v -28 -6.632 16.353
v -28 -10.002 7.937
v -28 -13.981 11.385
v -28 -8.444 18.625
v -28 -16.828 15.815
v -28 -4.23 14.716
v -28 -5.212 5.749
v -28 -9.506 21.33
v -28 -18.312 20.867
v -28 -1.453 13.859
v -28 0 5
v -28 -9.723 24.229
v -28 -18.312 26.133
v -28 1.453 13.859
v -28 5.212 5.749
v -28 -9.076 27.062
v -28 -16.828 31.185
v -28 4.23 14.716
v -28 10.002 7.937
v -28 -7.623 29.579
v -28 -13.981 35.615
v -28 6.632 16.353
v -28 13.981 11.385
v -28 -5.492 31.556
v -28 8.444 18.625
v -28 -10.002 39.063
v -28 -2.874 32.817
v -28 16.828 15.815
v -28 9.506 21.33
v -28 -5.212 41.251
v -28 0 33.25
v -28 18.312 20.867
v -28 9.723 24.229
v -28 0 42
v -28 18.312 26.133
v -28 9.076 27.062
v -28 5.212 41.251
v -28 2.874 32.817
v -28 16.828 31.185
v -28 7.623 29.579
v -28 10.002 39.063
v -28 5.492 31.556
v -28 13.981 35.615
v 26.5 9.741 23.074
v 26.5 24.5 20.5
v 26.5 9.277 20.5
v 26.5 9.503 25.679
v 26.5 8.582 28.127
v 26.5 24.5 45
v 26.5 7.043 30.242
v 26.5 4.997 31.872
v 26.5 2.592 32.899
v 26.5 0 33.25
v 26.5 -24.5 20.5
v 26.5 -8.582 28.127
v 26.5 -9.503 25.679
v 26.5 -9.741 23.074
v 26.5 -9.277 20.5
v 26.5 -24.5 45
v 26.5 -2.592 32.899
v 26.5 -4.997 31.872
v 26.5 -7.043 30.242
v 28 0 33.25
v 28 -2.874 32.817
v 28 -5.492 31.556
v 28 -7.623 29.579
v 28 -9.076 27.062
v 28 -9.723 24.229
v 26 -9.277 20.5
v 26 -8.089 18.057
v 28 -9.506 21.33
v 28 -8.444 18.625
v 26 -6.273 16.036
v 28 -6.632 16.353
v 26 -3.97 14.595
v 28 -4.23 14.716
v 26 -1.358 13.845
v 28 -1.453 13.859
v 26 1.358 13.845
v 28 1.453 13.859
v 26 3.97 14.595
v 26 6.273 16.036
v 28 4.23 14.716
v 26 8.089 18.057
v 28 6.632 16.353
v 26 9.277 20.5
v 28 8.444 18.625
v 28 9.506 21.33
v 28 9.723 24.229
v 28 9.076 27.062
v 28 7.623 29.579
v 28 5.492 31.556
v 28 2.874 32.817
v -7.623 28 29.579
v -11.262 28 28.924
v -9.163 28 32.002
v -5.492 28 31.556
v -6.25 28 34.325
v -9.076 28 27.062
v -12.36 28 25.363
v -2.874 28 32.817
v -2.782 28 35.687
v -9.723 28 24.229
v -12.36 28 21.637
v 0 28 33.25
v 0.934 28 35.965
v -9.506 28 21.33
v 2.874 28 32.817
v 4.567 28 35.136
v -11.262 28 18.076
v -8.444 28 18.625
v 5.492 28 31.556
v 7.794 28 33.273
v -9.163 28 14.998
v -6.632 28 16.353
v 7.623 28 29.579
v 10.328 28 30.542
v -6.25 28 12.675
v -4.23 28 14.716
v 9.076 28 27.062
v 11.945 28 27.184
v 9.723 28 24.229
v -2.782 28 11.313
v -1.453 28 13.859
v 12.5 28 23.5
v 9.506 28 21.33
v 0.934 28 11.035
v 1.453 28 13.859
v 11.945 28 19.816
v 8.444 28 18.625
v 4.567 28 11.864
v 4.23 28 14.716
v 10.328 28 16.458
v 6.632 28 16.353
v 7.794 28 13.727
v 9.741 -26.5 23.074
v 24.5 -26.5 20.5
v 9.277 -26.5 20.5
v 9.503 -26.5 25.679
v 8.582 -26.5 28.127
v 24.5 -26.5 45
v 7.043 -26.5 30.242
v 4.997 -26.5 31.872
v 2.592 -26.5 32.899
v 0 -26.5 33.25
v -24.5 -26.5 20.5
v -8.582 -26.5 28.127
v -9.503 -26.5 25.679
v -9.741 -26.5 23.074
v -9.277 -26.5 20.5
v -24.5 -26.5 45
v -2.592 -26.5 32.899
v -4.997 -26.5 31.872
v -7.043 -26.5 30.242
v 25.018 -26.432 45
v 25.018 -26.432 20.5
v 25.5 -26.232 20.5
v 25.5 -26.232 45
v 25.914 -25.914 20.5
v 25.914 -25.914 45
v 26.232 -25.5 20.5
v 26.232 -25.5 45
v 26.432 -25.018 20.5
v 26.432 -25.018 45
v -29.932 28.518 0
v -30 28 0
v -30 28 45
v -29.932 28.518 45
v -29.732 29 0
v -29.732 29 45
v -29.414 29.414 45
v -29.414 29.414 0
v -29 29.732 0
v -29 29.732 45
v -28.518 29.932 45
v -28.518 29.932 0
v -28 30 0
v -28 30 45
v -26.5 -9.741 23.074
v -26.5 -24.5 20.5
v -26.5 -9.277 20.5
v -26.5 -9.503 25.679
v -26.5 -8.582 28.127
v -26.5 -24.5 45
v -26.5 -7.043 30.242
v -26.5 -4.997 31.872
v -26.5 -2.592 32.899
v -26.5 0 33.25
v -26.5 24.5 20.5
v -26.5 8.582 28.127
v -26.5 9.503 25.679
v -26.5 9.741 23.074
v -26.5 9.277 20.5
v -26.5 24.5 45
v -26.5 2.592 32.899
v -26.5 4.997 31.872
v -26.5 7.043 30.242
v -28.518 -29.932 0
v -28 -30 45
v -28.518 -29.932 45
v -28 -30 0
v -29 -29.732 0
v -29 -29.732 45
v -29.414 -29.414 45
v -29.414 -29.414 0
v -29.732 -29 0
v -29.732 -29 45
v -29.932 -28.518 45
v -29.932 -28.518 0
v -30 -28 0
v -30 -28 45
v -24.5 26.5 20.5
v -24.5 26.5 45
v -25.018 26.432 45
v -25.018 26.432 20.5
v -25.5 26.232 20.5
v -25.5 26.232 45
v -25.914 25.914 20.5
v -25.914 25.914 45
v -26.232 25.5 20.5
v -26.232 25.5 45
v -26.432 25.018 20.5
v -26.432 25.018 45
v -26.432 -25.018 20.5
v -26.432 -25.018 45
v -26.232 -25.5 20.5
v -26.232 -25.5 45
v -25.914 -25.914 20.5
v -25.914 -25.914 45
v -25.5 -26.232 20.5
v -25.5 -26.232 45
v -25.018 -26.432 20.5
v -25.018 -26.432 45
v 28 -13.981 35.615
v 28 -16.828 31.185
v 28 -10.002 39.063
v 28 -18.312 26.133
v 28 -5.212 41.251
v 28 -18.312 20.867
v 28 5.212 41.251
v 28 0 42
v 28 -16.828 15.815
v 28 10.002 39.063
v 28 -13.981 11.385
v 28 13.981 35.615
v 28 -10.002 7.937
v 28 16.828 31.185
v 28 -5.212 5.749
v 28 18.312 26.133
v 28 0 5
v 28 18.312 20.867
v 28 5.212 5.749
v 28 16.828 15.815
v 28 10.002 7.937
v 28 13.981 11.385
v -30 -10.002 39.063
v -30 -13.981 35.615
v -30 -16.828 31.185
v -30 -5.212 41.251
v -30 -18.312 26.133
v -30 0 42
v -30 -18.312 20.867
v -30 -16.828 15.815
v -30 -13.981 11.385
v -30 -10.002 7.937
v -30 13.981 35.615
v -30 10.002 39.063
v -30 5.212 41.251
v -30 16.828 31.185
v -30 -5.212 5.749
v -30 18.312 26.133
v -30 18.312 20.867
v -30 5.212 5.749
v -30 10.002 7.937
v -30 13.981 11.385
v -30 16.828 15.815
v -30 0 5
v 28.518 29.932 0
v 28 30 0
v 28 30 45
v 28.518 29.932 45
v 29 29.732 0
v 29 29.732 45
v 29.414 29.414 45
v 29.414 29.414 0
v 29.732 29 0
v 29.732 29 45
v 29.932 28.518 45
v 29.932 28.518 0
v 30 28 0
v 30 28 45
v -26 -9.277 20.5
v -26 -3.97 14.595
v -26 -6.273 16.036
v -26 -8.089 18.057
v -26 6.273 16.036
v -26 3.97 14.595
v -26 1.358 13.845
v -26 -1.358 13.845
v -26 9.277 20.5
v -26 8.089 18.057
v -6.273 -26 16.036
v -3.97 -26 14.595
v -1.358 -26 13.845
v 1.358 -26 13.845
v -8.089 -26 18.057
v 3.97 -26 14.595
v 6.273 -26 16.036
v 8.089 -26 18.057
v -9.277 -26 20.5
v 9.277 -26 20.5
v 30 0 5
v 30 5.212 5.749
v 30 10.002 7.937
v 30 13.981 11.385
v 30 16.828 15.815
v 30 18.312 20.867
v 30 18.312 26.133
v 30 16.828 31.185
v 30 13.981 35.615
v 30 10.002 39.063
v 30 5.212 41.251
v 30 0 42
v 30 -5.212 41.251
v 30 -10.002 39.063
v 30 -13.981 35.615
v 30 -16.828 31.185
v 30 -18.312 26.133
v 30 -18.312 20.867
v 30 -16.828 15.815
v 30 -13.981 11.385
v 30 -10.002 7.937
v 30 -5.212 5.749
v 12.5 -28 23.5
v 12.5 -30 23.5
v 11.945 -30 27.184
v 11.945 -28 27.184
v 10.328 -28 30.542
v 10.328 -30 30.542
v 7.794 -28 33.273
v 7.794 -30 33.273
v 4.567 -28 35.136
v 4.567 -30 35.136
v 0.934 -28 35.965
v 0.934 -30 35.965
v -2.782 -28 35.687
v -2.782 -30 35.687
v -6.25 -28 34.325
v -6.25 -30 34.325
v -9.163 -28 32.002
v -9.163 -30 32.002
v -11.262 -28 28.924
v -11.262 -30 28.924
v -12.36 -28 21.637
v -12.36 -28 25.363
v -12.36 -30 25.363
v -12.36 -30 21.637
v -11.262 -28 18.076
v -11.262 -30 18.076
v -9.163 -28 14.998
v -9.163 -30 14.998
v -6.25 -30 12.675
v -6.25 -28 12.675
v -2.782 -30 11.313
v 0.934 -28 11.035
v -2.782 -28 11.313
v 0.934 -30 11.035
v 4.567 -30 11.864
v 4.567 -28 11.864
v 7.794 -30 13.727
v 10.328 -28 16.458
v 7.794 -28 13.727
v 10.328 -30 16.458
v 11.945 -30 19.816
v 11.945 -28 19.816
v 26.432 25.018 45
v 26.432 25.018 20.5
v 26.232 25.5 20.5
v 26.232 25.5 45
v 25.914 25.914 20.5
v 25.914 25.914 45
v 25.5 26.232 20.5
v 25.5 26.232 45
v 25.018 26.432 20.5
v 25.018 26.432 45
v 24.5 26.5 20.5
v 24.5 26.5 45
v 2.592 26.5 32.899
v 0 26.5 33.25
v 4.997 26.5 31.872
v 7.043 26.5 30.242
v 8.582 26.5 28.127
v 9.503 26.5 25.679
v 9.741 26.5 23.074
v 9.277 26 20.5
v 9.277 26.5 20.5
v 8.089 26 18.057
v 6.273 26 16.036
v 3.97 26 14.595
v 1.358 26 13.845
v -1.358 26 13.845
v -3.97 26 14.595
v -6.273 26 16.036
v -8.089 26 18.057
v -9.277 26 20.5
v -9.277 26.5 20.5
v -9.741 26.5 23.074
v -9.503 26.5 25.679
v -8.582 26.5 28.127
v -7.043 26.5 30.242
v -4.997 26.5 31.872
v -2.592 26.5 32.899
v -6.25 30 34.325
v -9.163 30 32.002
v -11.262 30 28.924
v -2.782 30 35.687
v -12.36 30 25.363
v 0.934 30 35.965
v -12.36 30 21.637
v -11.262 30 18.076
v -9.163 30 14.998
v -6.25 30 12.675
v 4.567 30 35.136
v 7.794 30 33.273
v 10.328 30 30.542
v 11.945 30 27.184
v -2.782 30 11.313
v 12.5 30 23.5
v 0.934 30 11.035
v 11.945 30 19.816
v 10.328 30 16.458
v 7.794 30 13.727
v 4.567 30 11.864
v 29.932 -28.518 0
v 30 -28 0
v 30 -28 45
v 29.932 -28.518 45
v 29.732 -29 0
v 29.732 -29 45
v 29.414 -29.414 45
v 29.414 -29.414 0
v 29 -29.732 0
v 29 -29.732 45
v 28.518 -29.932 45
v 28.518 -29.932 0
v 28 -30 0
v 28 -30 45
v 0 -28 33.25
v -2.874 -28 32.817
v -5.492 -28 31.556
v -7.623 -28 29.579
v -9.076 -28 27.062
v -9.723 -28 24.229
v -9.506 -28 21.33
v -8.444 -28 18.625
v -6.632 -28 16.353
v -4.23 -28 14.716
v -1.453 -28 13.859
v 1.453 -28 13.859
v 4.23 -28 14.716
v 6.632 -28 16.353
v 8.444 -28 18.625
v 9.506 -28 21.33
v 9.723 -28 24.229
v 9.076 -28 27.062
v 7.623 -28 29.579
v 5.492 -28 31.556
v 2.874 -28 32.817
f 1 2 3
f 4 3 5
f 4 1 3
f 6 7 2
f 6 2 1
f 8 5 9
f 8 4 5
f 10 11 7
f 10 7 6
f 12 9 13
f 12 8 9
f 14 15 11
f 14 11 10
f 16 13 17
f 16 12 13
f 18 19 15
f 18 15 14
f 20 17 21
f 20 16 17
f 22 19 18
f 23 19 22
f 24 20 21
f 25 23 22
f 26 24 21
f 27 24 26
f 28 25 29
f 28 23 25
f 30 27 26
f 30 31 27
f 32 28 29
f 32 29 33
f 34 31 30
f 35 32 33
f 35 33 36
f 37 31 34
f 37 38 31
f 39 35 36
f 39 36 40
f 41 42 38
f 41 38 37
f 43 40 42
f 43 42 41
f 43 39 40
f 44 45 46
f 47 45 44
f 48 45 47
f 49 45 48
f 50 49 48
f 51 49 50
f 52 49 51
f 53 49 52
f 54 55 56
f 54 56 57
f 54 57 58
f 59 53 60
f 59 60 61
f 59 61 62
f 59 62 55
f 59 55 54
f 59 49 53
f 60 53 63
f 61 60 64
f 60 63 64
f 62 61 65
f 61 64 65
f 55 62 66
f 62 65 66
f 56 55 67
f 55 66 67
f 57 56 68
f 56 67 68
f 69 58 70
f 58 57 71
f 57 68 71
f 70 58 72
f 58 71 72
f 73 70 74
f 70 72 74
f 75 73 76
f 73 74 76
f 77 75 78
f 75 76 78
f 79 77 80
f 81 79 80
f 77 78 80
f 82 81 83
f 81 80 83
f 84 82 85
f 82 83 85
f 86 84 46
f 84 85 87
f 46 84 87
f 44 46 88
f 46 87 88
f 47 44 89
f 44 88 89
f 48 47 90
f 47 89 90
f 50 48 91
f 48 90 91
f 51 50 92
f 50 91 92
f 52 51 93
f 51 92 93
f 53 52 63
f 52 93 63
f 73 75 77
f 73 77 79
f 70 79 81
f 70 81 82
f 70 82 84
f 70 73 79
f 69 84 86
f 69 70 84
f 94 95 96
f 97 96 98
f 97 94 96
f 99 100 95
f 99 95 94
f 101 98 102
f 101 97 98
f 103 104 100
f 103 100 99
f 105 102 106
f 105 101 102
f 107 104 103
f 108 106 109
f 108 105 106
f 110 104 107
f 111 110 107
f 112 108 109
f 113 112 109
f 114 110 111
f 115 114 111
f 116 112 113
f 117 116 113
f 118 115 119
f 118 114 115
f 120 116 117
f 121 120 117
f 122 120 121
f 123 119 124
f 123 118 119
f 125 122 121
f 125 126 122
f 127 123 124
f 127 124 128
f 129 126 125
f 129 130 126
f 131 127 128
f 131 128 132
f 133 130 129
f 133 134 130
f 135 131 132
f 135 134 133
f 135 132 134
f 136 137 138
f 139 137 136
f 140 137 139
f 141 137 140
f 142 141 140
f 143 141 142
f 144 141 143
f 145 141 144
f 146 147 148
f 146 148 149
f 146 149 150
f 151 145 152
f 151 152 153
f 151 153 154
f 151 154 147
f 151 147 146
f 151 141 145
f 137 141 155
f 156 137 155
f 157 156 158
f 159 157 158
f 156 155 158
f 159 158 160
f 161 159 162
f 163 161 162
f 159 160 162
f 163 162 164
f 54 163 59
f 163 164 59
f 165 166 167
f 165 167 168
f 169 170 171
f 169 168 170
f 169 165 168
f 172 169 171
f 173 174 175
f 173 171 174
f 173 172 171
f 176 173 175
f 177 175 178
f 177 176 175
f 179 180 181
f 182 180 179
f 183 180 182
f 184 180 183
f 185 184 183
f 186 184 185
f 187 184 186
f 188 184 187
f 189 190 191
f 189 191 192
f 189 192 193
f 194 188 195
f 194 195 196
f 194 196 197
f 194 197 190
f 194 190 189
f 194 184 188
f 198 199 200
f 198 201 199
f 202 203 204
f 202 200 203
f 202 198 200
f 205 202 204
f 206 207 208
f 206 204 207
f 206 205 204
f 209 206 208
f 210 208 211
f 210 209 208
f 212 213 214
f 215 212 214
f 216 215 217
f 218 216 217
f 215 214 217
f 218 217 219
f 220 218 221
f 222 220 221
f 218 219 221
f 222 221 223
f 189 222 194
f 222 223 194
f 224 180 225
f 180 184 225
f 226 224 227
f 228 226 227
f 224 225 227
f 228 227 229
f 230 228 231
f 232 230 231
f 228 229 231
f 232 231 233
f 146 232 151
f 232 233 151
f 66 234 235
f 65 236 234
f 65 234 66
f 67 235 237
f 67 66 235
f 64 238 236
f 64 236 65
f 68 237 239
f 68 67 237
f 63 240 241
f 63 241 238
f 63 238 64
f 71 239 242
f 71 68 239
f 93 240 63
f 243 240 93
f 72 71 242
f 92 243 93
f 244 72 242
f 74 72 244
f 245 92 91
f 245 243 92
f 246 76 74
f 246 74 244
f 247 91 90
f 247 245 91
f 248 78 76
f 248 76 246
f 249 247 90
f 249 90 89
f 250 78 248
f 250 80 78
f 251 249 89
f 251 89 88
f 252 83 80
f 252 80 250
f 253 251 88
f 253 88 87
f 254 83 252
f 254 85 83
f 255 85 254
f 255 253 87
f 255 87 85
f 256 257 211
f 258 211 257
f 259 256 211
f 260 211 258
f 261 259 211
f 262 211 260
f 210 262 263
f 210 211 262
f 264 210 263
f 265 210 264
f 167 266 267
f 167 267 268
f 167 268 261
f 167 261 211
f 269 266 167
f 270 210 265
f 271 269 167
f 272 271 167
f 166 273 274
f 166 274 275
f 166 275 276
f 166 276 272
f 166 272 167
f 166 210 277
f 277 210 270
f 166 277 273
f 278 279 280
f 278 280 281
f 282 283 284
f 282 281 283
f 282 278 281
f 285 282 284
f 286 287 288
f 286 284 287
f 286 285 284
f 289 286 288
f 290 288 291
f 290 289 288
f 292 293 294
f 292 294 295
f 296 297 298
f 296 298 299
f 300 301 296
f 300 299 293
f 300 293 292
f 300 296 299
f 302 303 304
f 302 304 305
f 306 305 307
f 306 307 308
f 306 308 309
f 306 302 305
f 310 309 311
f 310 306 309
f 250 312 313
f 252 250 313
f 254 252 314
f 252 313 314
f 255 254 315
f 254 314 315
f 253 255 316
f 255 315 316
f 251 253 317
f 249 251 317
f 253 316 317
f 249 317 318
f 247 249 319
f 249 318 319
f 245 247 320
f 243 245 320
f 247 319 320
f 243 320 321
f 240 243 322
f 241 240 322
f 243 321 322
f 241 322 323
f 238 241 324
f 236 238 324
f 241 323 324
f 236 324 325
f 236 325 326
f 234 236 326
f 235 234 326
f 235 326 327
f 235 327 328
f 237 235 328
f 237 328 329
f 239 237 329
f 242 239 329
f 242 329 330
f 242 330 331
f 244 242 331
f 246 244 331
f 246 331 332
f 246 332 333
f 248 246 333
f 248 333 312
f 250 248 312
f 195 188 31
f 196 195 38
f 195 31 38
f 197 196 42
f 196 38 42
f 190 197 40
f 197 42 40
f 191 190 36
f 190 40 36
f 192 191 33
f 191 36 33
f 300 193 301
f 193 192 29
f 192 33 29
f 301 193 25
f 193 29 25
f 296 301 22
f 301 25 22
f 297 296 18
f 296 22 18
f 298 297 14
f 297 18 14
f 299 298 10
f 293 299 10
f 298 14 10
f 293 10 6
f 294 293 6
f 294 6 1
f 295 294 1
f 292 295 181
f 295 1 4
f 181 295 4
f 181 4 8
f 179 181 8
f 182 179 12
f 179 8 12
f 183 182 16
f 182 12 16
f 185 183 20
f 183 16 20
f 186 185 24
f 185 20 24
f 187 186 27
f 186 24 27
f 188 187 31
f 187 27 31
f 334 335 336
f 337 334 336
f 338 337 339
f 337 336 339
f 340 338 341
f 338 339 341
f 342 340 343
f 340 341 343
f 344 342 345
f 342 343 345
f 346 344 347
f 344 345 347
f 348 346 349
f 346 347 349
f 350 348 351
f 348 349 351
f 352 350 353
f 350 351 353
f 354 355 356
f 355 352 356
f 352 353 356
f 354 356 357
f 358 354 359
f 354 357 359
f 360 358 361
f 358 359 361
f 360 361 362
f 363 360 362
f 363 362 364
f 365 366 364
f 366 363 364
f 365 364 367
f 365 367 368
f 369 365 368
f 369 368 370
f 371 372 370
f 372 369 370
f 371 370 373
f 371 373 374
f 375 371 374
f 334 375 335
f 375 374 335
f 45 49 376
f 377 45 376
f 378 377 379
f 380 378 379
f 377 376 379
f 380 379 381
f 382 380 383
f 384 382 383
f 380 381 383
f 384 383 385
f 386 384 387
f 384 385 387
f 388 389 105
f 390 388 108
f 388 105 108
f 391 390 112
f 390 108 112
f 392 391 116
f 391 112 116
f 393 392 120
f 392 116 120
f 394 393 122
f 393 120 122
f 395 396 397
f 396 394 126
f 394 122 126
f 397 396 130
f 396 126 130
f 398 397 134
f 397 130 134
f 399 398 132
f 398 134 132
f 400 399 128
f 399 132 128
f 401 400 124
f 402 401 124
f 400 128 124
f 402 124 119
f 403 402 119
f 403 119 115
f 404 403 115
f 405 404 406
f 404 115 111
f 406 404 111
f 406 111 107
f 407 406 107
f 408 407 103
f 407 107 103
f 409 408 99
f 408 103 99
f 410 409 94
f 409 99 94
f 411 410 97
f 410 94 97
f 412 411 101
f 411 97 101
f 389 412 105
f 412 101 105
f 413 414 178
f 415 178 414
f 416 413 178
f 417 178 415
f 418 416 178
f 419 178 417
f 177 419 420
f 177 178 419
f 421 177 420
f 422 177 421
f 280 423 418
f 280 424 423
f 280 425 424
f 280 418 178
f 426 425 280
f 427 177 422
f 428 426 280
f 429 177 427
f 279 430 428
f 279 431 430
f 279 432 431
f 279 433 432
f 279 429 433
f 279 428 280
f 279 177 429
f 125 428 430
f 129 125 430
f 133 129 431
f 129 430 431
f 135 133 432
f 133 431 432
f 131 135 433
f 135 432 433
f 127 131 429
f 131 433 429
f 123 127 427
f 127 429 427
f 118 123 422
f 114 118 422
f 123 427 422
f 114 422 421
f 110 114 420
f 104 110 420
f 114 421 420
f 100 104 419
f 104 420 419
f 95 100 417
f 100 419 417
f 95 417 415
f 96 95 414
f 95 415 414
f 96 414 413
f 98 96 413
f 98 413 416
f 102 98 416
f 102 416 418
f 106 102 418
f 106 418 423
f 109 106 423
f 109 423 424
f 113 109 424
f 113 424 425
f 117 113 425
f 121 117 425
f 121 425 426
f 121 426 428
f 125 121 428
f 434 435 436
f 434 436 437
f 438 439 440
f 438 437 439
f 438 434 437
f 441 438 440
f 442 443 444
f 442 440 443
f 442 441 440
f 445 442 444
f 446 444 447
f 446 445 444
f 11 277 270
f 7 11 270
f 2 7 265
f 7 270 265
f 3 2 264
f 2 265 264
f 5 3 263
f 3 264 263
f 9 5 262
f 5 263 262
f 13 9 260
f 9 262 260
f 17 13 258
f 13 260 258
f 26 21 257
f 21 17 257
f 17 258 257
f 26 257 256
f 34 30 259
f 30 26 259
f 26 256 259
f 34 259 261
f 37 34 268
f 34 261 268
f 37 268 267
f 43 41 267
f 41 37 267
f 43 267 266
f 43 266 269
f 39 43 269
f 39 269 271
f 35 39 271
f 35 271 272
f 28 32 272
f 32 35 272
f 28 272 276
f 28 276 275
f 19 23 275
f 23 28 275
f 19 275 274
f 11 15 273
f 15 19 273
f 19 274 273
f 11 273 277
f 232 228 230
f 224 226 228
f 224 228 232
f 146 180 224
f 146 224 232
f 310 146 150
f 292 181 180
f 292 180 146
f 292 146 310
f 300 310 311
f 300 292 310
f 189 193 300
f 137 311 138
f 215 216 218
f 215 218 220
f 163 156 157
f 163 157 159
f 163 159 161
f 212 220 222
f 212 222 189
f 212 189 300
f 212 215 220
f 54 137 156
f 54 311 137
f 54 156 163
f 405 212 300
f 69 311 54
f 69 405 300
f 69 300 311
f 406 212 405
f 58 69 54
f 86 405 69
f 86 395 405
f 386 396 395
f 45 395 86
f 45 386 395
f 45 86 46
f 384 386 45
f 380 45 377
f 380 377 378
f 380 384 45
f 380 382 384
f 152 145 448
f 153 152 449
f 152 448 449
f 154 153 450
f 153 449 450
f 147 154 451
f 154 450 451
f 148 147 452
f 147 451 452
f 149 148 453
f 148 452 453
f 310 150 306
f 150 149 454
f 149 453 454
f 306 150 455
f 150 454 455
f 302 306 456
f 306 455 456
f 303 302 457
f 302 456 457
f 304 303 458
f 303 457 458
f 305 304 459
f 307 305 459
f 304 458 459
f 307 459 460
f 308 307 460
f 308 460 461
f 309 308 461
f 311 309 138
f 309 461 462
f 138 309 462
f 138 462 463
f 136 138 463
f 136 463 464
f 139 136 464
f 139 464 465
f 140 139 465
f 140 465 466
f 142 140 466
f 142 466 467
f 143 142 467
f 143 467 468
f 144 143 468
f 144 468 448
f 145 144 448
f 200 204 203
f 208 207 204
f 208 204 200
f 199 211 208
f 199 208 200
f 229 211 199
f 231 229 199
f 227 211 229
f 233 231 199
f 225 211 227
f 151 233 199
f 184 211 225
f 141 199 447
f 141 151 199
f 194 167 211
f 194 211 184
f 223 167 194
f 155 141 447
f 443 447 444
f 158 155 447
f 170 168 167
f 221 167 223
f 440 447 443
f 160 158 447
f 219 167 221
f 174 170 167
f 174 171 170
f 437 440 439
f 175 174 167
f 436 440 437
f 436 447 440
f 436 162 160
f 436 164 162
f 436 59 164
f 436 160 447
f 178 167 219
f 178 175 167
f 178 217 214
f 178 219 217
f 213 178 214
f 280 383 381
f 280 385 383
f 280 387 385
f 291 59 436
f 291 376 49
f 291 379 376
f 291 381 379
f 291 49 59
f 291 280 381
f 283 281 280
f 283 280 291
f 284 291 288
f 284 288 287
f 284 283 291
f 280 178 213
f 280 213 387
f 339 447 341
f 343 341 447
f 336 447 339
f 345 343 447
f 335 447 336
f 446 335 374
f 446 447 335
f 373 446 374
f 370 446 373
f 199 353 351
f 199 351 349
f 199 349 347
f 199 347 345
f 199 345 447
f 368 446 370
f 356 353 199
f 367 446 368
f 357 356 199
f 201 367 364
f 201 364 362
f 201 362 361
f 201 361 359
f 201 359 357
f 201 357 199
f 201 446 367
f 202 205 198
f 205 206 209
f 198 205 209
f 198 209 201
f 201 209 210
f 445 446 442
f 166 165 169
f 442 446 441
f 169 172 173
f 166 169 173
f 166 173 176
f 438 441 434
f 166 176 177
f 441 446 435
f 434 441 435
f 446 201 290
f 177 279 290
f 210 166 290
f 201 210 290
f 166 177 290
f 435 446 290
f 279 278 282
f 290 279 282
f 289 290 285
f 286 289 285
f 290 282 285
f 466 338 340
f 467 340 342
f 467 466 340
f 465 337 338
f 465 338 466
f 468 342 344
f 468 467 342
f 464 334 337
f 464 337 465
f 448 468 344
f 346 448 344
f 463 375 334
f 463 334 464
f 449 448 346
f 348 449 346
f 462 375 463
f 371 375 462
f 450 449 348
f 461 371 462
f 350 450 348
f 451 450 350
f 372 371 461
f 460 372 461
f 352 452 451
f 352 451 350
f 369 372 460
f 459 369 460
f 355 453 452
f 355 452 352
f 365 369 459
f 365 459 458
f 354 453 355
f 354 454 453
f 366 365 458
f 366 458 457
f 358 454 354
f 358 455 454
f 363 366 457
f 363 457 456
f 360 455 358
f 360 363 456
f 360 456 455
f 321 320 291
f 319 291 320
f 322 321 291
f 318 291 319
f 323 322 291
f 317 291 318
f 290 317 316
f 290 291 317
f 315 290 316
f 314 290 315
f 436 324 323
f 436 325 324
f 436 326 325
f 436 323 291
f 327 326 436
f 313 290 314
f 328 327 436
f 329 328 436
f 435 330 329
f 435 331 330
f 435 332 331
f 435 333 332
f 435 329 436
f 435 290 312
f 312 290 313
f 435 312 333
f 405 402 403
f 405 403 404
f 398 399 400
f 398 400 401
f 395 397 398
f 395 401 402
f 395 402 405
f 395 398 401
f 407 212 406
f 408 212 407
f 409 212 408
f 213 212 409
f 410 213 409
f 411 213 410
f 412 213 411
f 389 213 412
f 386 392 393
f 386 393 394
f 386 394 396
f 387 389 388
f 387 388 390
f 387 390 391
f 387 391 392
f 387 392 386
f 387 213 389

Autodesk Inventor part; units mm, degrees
ref_plane "YZ Plane" through (0, 0, 0) normal (1, 0, 0) x (0, 1, 0)
ref_plane "XZ Plane" through (0, 0, 0) normal (0, 1, 0) x (-1, 0, 0)
ref_plane "XY Plane" through (0, 0, 0) normal (0, 0, 1) x (1, 0, 0)
sketch "Sketch1" plane through (0, 0, 0) normal (0, 0, 1) x (1, 0, 0)
  line L0 (-28, 30) -> (28, 30)
  line L1 (30, 28) -> (30, -28)
  line L2 (28, -30) -> (-28, -30)
  line L3 (-30, -28) -> (-30, 28)
  arc A0 (-28, 30) -> (-30, 28) centre (-28, 28) ccw
  arc A1 (-30, -28) -> (-28, -30) centre (-28, -28) ccw
  arc A2 (28, -30) -> (30, -28) centre (28, -28) ccw
  arc A3 (30, 28) -> (28, 30) centre (28, 28) ccw
  point P0 (0, 0)
  point P1 (-30, 30)
  point P2 (30, -30)
  point P3 (30, 30)
  dimension "d0" = 60
  dimension "d1" = 60
  dimension "d2" = 30
  dimension "d3" = 30
  dimension "d4" = 2
extrude "Extrusion1" add sketch "Sketch1" along normal blind 45
sketch "Sketch2" plane through (0, 0, 45) normal (0, 0, 1) x (1, 0, 0)
  line L0 (-24.5, 26.5) -> (24.5, 26.5)
  line L1 (26.5, 24.5) -> (26.5, -24.5)
  line L2 (24.5, -26.5) -> (-24.5, -26.5)
  line L3 (-26.5, -24.5) -> (-26.5, 24.5)
  arc A0 (-24.5, 26.5) -> (-26.5, 24.5) centre (-24.5, 24.5) ccw
  arc A1 (-26.5, -24.5) -> (-24.5, -26.5) centre (-24.5, -24.5) ccw
  arc A2 (24.5, -26.5) -> (26.5, -24.5) centre (24.5, -24.5) ccw
  arc A3 (26.5, 24.5) -> (24.5, 26.5) centre (24.5, 24.5) ccw
  point P0 (0, 0)
  point P1 (-26.5, 26.5)
  point P2 (26.5, -26.5)
  point P3 (26.5, 26.5)
  dimension "d7" = 53
  dimension "d8" = 53
  dimension "d9" = 26.5
  dimension "d10" = 26.5
  dimension "d11" = 2
extrude "Extrusion2" cut sketch "Sketch2" against normal blind 24.5
sketch "Sketch3" plane through (30, -28, 0) normal (1, 0, 0) x (0, 0, -1)
  circle A0 centre (-23.5, 28) radius 18.5
  line L0 (0, 0) -> (0, 56) projected
  point P0 (0, 28)
  point P1 (0, 28)
  dimension "d14" = 37
  dimension "d15" = 23.5
extrude "Extrusion3" cut sketch "Sketch3" against normal blind 2
mirror "Mirror1" about plane through (0, 0, 0) normal (1, 0, 0) of "Extrusion3"
sketch "Sketch4" plane through (-28, 30, 0) normal (0, 1, 0) x (1, 0, 0)
  circle A0 centre (28, -23.5) radius 12.5
  point P0 (28, 0)
  dimension "d18" = 25
  dimension "d19" = 23.5
extrude "Extrusion4" cut sketch "Sketch4" against normal blind 2
mirror "Mirror2" about plane through (0, 0, 0) normal (0, 1, 0) of "Extrusion4"
sketch "Sketch5" plane through (-28, 0, 23.5) normal (-1, 0, 0) x (0, 0, 1)
  circle A0 centre (0, 0) radius 9.75
  circle A1 centre (0, 0) radius 18.5 projected
  point P0 (-23.5, 0)
  dimension "d22" = 19.5
extrude "Extrusion5" cut sketch "Sketch5" against normal blind 2 contours A0
pattern_circular "Circular Pattern1" count 4 over 360 about axis through (0, 0, -10) along (0, 0, 1) of "Extrusion5"
sketch "Sketch6" plane through (0, 0, 20.5) normal (0, 0, 1) x (1, 0, 0)
  line L0 (-20, 17) -> (22, 17)
  line L1 (22, 17) -> (22, -20)
  line L2 (22, -20) -> (-20, -20)
  line L3 (-20, -20) -> (-20, 17)
  point P0 (0, 0)
equation "\"d2\" = 0.5 * d0"
equation "\"d3\" = 0.5 * d1"
equation "\"d9\" = 0.5 * d8"
equation "\"d10\" = 0.5 * d7"
properties part number "sampleChamber_singlePiece_filipeSample_V2"
